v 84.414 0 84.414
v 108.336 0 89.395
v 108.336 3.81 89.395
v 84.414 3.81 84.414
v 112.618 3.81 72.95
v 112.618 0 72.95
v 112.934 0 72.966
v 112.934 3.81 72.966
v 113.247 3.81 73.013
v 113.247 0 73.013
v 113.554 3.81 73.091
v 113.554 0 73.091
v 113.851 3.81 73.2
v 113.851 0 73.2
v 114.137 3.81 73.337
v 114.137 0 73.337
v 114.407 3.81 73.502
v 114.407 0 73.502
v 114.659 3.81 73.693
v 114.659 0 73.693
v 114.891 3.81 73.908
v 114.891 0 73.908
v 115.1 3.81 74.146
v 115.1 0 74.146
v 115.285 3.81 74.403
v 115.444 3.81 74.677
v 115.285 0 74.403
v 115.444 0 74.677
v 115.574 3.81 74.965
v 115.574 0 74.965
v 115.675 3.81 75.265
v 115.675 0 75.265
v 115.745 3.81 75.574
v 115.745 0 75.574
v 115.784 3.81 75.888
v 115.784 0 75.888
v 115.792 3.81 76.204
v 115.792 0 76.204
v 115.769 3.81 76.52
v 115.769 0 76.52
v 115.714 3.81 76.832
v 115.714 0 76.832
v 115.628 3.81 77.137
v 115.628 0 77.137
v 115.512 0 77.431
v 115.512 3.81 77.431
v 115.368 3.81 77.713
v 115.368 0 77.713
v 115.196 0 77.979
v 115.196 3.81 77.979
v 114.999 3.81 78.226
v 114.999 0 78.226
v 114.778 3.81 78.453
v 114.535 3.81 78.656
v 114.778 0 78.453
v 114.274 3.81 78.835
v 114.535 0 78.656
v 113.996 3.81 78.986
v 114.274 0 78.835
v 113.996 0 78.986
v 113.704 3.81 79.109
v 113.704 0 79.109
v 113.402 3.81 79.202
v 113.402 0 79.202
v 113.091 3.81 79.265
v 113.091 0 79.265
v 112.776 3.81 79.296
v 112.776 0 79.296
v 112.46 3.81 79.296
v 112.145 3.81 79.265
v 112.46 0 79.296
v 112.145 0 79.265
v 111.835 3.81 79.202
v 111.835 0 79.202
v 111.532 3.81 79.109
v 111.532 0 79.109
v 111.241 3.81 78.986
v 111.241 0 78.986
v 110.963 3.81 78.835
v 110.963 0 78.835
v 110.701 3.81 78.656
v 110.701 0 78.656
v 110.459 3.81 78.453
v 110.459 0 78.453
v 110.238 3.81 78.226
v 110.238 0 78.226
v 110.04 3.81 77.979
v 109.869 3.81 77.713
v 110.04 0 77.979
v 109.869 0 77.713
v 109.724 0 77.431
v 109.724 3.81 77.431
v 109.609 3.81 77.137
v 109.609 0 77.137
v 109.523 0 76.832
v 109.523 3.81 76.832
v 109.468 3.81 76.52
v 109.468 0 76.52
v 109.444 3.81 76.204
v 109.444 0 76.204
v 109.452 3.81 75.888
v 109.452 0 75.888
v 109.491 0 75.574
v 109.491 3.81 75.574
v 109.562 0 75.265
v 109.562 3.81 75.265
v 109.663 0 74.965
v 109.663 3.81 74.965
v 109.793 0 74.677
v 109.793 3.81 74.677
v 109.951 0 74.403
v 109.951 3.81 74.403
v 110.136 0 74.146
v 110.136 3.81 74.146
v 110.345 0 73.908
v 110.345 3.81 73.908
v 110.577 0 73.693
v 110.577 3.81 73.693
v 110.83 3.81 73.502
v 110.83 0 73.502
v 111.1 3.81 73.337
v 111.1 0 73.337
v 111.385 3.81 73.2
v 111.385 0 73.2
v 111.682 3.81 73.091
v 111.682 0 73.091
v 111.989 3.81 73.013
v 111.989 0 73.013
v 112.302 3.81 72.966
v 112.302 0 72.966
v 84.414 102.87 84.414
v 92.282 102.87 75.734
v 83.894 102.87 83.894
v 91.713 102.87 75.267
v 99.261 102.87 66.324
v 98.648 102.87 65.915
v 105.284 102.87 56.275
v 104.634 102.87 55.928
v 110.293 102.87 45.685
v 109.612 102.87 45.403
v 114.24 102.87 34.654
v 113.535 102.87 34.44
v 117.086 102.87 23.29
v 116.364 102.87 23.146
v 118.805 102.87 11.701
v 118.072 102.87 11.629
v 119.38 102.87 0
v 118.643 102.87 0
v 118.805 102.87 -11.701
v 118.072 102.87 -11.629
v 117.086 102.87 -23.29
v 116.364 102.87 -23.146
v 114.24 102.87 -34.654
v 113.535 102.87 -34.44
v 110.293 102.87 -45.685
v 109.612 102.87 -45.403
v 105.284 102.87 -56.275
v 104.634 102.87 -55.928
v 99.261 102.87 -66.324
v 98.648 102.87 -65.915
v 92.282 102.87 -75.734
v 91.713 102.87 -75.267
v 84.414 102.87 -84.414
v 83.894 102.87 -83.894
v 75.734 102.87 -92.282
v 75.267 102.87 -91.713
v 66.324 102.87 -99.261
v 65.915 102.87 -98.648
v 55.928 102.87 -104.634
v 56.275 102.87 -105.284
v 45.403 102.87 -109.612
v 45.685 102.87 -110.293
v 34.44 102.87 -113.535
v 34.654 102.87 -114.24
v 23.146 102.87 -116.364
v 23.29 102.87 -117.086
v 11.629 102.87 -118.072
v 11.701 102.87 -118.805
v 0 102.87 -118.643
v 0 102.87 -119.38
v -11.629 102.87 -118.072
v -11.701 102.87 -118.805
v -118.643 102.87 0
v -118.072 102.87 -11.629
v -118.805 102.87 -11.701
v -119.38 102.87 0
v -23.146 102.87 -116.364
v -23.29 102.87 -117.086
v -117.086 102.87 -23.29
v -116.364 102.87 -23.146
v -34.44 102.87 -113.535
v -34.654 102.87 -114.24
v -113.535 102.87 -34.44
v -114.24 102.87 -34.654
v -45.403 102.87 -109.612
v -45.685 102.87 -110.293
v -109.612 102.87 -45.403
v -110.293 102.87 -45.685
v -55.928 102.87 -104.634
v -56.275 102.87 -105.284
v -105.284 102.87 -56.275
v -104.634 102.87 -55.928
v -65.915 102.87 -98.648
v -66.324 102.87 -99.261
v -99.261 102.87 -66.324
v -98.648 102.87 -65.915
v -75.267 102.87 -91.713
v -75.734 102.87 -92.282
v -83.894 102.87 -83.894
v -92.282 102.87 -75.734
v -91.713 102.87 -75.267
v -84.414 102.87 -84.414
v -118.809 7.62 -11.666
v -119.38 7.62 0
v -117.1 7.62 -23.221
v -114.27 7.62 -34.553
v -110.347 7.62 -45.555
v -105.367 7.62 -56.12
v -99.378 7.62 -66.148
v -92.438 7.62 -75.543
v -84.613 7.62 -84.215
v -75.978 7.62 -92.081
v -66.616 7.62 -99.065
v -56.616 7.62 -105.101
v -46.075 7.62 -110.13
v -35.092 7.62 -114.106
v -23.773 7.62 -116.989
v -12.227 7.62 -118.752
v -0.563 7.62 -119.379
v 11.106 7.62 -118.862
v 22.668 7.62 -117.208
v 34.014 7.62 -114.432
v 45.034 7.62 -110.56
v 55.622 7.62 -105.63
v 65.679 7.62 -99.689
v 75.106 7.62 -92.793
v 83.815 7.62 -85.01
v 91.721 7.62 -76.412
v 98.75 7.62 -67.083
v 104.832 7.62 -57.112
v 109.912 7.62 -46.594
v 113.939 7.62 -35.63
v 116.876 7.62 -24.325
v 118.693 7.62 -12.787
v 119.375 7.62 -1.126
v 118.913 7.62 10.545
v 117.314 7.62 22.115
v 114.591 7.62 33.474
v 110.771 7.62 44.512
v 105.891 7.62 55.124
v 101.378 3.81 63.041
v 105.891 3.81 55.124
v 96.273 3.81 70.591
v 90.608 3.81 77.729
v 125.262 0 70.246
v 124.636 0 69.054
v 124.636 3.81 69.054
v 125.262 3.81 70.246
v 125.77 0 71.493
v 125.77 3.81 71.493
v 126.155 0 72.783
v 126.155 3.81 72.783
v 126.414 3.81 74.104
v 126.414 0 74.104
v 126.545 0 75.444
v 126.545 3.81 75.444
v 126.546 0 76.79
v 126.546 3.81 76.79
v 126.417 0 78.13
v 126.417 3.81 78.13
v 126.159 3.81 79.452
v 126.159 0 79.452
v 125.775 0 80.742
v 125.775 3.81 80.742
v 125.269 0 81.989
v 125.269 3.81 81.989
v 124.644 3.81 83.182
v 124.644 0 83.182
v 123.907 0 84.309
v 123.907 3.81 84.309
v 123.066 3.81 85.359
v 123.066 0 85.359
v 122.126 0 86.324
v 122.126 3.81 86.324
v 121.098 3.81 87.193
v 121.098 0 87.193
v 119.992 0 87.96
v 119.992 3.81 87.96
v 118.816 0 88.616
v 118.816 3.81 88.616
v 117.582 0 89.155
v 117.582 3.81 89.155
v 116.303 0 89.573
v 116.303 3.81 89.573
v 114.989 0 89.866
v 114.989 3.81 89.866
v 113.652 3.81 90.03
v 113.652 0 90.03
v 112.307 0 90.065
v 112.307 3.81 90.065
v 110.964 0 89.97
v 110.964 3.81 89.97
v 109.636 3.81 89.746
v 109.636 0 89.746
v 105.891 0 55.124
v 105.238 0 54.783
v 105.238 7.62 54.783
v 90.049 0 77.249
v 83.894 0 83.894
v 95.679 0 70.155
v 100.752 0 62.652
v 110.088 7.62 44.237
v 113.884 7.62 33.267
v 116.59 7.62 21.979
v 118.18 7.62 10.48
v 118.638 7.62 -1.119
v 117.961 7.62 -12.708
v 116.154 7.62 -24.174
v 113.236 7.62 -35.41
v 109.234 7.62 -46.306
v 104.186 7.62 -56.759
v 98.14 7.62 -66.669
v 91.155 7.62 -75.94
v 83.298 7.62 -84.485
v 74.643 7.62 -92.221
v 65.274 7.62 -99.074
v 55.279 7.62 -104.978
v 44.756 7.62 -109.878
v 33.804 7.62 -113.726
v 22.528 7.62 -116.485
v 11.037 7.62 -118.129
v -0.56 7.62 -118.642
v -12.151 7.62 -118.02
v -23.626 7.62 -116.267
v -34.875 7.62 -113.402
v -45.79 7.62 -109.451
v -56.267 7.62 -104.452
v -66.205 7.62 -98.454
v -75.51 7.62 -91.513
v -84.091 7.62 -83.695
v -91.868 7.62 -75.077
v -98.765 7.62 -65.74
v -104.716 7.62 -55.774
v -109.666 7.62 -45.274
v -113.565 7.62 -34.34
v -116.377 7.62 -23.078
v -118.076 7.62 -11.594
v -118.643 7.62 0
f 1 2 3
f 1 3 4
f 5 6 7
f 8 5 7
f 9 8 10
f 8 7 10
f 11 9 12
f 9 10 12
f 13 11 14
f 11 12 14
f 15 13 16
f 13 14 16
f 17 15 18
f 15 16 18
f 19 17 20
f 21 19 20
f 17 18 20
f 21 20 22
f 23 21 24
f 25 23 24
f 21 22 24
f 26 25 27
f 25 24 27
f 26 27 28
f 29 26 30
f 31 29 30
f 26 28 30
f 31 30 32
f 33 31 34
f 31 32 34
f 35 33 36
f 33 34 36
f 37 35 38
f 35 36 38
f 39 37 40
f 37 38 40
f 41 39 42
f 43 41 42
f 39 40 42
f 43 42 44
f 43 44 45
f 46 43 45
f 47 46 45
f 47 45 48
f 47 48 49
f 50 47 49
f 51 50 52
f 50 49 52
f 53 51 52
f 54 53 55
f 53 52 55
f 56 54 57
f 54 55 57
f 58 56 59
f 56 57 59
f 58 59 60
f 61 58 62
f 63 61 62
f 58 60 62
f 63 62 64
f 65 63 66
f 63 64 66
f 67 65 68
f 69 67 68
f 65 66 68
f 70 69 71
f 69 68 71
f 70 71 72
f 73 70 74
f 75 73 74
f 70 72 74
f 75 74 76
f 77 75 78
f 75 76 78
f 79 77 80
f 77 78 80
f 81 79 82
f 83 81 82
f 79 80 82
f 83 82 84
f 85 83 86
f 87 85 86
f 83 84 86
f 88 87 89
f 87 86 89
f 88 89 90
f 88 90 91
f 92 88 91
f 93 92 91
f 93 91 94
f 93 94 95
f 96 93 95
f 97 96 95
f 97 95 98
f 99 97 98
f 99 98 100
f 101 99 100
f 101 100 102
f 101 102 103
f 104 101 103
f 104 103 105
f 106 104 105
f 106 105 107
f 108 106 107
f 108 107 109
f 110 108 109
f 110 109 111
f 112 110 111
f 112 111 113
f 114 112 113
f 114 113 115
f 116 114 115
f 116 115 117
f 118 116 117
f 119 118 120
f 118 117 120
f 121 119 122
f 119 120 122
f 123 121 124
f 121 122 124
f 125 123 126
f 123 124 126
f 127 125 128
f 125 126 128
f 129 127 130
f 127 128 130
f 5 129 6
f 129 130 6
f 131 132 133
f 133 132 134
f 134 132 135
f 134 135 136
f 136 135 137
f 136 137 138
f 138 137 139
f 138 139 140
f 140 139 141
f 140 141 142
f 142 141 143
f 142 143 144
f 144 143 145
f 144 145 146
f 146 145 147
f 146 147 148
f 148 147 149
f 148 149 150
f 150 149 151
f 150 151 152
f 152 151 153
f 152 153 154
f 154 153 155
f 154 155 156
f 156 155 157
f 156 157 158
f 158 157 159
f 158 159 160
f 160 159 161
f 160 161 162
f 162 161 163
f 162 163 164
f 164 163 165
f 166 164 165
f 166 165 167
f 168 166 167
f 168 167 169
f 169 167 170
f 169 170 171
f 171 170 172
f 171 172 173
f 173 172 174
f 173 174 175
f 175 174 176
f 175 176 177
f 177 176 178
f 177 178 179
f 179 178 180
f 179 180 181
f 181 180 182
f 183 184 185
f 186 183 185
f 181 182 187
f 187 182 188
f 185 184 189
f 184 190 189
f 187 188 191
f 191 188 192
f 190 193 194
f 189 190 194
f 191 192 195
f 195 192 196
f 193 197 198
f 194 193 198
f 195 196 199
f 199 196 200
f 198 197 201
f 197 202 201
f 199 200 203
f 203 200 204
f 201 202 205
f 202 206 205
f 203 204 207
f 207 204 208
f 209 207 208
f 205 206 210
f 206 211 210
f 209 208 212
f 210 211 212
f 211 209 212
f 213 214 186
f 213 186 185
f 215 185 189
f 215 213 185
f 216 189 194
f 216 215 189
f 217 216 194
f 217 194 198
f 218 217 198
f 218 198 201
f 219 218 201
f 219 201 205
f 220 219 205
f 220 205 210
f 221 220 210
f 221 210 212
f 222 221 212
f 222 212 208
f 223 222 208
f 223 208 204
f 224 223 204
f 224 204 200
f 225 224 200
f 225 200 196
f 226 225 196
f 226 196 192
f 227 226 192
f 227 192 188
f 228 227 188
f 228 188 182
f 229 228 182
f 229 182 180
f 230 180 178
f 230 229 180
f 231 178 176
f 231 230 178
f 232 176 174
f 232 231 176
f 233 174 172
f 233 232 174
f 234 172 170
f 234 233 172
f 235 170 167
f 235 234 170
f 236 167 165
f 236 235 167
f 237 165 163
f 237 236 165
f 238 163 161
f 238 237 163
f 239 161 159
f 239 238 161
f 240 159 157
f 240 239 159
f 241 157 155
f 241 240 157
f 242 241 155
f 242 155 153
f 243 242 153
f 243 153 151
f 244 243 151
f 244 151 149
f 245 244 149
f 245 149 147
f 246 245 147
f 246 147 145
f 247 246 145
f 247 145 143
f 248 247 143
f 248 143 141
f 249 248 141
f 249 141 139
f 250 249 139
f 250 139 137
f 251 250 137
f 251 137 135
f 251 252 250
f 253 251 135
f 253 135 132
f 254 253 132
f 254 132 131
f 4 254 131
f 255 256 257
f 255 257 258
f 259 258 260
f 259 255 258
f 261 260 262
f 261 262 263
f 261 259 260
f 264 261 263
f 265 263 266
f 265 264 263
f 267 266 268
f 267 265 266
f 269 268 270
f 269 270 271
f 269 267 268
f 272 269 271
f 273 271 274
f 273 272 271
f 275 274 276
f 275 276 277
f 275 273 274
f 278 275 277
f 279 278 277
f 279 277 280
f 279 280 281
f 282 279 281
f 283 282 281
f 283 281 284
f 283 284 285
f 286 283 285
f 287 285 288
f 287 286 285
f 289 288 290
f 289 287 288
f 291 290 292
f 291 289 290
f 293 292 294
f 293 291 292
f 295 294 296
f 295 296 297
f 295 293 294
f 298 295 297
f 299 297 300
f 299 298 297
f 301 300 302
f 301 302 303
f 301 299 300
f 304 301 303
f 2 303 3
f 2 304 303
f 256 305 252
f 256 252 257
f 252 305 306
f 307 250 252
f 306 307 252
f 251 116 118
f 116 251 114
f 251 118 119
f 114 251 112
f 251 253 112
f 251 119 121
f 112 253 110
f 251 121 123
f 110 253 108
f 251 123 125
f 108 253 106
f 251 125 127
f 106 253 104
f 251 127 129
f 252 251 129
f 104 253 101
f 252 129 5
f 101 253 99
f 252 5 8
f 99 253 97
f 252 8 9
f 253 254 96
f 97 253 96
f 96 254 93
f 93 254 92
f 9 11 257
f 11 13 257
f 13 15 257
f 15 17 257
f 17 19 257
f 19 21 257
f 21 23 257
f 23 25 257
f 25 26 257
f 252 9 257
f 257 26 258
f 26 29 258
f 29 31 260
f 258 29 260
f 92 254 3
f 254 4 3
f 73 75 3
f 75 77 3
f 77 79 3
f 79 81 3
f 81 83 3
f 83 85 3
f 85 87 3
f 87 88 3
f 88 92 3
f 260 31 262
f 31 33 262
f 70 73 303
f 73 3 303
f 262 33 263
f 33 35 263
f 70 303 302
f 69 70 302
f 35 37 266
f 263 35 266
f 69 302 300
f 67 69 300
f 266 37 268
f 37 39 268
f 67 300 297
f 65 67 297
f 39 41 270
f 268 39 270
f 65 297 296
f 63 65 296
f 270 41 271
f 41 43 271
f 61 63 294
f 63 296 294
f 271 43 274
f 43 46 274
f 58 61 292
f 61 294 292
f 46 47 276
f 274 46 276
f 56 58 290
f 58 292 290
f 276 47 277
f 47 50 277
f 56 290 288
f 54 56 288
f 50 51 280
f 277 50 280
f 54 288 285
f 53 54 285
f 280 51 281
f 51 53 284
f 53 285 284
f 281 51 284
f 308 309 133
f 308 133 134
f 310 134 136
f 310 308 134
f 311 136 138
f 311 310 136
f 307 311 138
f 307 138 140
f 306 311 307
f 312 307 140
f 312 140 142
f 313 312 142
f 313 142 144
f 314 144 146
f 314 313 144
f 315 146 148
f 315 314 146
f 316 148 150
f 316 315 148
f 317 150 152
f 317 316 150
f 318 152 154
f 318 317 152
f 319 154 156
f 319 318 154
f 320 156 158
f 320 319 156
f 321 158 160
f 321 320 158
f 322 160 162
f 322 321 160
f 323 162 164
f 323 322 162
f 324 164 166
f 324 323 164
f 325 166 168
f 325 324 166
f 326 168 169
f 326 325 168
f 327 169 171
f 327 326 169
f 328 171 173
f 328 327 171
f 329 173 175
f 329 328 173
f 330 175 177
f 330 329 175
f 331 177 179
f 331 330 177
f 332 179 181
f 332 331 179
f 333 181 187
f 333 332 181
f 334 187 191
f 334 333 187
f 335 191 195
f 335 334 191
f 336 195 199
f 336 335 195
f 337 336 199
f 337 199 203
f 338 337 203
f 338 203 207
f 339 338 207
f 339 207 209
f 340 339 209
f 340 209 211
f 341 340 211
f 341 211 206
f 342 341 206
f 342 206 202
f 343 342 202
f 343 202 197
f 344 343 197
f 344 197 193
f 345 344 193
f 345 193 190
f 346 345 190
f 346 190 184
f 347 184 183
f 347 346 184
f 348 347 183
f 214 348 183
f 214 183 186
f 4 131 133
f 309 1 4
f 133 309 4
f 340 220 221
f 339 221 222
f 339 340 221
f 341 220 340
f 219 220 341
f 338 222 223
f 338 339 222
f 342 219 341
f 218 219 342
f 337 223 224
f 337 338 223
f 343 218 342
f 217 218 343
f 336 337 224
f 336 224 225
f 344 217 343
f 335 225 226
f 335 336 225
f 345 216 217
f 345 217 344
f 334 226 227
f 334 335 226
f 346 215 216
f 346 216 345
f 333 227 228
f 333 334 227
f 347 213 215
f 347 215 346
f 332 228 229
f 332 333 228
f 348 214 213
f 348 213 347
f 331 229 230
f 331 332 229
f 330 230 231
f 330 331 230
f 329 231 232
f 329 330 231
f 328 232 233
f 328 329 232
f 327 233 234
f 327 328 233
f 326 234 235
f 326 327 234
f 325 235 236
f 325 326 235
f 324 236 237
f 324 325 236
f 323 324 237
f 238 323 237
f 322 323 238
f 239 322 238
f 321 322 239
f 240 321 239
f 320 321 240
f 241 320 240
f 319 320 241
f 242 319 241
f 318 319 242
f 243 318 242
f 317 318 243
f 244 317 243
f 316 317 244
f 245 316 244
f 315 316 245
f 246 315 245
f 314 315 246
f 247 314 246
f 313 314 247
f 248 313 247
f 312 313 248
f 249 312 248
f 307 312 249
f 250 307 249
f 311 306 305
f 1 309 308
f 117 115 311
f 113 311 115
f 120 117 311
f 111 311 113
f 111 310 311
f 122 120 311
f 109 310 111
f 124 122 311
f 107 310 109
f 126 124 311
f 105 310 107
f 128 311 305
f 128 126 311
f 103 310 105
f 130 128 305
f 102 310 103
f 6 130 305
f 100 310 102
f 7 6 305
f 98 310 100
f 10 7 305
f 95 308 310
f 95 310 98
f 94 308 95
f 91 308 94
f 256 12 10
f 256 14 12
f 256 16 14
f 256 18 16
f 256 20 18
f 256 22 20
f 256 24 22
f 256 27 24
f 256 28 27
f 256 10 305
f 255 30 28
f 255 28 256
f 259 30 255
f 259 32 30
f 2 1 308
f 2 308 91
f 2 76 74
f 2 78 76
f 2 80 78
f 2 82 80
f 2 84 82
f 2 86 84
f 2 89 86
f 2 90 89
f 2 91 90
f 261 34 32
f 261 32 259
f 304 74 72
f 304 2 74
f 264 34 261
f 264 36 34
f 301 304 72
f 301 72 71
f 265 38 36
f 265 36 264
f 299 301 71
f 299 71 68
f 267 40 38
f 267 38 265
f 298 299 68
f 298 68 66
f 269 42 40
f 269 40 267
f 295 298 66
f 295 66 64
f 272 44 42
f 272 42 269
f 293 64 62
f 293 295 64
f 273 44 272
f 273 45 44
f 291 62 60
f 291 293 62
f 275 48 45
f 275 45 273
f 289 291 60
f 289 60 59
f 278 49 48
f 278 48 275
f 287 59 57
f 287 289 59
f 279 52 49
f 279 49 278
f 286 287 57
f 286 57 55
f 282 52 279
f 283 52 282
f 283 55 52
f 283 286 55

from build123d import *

# Parameters (mm, degrees)
BASE_FLANGE1_DEPTH  = 102.87
CUT_EXTRUDE1_START  = -7.62
CUT_EXTRUDE1_DEPTH  = 7.62
SKETCH8_R           = 3.175
BOSS_EXTRUDE1_DEPTH = 3.81


# Read off the part's stored shape, not the designer's step: Cut-Extrude1
# Sheet-metal steps are written as plain solids
with BuildPart() as part:
    # Sketch2 → Base-Flange1 (new body)
    with BuildSketch(Plane(origin=(0, 0, 0), x_dir=(1, 0, 0), z_dir=(0, 1, 0))):
        with BuildLine():
            ThreePointArc((-119.38, 0), (45.684748156, 110.292738591), (84.414407538, -84.414407538))
            Line((84.414407538, -84.414407538), (83.893552683, -83.893552683))
            ThreePointArc((83.893552683, -83.893552683), (45.402863539, 109.612208928), (-118.6434, 0))
            Line((-118.6434, 0), (-119.38, 0))
        make_face()
    extrude(amount=BASE_FLANGE1_DEPTH)

    # Cut-Extrude1 outline → Cut-Extrude1 (cut)
    with BuildSketch(Plane.XZ.offset(CUT_EXTRUDE1_START)):
        with BuildLine():
            ThreePointArc((-119.38, 0), (28.374941826, -115.958816294), (105.891353265, 55.123549448))
            Line((105.891353265, 55.123549448), (105.237981085, 54.783425419))
            ThreePointArc((105.237981085, 54.783425419), (28.199862397, -115.243325726), (-118.6434, 0))
            Line((-118.6434, 0), (-119.38, 0))
        make_face()
    extrude(amount=CUT_EXTRUDE1_DEPTH, mode=Mode.SUBTRACT)

    # Sketch8 → Boss-Extrude1 (add)
    with BuildSketch(Plane.XZ):
        with BuildLine():
            Line((105.891353265, 55.123549448), (124.635571409, 69.054164544))
            ThreePointArc((124.635571409, 69.054164544), (123.499250093, 84.844358217), (108.336377108, 89.39504225))
            Line((108.336377108, 89.39504225), (84.414407538, 84.414407538))
            ThreePointArc((84.414407538, 84.414407538), (96.273356857, 70.590545822), (105.891353265, 55.123549448))
        make_face()
        with Locations(Location((112.618181959, 76.125332112, 0), (0, 0, 270))):
            Circle(SKETCH8_R, mode=Mode.SUBTRACT)
    extrude(amount=-BOSS_EXTRUDE1_DEPTH)


solid = part.part
